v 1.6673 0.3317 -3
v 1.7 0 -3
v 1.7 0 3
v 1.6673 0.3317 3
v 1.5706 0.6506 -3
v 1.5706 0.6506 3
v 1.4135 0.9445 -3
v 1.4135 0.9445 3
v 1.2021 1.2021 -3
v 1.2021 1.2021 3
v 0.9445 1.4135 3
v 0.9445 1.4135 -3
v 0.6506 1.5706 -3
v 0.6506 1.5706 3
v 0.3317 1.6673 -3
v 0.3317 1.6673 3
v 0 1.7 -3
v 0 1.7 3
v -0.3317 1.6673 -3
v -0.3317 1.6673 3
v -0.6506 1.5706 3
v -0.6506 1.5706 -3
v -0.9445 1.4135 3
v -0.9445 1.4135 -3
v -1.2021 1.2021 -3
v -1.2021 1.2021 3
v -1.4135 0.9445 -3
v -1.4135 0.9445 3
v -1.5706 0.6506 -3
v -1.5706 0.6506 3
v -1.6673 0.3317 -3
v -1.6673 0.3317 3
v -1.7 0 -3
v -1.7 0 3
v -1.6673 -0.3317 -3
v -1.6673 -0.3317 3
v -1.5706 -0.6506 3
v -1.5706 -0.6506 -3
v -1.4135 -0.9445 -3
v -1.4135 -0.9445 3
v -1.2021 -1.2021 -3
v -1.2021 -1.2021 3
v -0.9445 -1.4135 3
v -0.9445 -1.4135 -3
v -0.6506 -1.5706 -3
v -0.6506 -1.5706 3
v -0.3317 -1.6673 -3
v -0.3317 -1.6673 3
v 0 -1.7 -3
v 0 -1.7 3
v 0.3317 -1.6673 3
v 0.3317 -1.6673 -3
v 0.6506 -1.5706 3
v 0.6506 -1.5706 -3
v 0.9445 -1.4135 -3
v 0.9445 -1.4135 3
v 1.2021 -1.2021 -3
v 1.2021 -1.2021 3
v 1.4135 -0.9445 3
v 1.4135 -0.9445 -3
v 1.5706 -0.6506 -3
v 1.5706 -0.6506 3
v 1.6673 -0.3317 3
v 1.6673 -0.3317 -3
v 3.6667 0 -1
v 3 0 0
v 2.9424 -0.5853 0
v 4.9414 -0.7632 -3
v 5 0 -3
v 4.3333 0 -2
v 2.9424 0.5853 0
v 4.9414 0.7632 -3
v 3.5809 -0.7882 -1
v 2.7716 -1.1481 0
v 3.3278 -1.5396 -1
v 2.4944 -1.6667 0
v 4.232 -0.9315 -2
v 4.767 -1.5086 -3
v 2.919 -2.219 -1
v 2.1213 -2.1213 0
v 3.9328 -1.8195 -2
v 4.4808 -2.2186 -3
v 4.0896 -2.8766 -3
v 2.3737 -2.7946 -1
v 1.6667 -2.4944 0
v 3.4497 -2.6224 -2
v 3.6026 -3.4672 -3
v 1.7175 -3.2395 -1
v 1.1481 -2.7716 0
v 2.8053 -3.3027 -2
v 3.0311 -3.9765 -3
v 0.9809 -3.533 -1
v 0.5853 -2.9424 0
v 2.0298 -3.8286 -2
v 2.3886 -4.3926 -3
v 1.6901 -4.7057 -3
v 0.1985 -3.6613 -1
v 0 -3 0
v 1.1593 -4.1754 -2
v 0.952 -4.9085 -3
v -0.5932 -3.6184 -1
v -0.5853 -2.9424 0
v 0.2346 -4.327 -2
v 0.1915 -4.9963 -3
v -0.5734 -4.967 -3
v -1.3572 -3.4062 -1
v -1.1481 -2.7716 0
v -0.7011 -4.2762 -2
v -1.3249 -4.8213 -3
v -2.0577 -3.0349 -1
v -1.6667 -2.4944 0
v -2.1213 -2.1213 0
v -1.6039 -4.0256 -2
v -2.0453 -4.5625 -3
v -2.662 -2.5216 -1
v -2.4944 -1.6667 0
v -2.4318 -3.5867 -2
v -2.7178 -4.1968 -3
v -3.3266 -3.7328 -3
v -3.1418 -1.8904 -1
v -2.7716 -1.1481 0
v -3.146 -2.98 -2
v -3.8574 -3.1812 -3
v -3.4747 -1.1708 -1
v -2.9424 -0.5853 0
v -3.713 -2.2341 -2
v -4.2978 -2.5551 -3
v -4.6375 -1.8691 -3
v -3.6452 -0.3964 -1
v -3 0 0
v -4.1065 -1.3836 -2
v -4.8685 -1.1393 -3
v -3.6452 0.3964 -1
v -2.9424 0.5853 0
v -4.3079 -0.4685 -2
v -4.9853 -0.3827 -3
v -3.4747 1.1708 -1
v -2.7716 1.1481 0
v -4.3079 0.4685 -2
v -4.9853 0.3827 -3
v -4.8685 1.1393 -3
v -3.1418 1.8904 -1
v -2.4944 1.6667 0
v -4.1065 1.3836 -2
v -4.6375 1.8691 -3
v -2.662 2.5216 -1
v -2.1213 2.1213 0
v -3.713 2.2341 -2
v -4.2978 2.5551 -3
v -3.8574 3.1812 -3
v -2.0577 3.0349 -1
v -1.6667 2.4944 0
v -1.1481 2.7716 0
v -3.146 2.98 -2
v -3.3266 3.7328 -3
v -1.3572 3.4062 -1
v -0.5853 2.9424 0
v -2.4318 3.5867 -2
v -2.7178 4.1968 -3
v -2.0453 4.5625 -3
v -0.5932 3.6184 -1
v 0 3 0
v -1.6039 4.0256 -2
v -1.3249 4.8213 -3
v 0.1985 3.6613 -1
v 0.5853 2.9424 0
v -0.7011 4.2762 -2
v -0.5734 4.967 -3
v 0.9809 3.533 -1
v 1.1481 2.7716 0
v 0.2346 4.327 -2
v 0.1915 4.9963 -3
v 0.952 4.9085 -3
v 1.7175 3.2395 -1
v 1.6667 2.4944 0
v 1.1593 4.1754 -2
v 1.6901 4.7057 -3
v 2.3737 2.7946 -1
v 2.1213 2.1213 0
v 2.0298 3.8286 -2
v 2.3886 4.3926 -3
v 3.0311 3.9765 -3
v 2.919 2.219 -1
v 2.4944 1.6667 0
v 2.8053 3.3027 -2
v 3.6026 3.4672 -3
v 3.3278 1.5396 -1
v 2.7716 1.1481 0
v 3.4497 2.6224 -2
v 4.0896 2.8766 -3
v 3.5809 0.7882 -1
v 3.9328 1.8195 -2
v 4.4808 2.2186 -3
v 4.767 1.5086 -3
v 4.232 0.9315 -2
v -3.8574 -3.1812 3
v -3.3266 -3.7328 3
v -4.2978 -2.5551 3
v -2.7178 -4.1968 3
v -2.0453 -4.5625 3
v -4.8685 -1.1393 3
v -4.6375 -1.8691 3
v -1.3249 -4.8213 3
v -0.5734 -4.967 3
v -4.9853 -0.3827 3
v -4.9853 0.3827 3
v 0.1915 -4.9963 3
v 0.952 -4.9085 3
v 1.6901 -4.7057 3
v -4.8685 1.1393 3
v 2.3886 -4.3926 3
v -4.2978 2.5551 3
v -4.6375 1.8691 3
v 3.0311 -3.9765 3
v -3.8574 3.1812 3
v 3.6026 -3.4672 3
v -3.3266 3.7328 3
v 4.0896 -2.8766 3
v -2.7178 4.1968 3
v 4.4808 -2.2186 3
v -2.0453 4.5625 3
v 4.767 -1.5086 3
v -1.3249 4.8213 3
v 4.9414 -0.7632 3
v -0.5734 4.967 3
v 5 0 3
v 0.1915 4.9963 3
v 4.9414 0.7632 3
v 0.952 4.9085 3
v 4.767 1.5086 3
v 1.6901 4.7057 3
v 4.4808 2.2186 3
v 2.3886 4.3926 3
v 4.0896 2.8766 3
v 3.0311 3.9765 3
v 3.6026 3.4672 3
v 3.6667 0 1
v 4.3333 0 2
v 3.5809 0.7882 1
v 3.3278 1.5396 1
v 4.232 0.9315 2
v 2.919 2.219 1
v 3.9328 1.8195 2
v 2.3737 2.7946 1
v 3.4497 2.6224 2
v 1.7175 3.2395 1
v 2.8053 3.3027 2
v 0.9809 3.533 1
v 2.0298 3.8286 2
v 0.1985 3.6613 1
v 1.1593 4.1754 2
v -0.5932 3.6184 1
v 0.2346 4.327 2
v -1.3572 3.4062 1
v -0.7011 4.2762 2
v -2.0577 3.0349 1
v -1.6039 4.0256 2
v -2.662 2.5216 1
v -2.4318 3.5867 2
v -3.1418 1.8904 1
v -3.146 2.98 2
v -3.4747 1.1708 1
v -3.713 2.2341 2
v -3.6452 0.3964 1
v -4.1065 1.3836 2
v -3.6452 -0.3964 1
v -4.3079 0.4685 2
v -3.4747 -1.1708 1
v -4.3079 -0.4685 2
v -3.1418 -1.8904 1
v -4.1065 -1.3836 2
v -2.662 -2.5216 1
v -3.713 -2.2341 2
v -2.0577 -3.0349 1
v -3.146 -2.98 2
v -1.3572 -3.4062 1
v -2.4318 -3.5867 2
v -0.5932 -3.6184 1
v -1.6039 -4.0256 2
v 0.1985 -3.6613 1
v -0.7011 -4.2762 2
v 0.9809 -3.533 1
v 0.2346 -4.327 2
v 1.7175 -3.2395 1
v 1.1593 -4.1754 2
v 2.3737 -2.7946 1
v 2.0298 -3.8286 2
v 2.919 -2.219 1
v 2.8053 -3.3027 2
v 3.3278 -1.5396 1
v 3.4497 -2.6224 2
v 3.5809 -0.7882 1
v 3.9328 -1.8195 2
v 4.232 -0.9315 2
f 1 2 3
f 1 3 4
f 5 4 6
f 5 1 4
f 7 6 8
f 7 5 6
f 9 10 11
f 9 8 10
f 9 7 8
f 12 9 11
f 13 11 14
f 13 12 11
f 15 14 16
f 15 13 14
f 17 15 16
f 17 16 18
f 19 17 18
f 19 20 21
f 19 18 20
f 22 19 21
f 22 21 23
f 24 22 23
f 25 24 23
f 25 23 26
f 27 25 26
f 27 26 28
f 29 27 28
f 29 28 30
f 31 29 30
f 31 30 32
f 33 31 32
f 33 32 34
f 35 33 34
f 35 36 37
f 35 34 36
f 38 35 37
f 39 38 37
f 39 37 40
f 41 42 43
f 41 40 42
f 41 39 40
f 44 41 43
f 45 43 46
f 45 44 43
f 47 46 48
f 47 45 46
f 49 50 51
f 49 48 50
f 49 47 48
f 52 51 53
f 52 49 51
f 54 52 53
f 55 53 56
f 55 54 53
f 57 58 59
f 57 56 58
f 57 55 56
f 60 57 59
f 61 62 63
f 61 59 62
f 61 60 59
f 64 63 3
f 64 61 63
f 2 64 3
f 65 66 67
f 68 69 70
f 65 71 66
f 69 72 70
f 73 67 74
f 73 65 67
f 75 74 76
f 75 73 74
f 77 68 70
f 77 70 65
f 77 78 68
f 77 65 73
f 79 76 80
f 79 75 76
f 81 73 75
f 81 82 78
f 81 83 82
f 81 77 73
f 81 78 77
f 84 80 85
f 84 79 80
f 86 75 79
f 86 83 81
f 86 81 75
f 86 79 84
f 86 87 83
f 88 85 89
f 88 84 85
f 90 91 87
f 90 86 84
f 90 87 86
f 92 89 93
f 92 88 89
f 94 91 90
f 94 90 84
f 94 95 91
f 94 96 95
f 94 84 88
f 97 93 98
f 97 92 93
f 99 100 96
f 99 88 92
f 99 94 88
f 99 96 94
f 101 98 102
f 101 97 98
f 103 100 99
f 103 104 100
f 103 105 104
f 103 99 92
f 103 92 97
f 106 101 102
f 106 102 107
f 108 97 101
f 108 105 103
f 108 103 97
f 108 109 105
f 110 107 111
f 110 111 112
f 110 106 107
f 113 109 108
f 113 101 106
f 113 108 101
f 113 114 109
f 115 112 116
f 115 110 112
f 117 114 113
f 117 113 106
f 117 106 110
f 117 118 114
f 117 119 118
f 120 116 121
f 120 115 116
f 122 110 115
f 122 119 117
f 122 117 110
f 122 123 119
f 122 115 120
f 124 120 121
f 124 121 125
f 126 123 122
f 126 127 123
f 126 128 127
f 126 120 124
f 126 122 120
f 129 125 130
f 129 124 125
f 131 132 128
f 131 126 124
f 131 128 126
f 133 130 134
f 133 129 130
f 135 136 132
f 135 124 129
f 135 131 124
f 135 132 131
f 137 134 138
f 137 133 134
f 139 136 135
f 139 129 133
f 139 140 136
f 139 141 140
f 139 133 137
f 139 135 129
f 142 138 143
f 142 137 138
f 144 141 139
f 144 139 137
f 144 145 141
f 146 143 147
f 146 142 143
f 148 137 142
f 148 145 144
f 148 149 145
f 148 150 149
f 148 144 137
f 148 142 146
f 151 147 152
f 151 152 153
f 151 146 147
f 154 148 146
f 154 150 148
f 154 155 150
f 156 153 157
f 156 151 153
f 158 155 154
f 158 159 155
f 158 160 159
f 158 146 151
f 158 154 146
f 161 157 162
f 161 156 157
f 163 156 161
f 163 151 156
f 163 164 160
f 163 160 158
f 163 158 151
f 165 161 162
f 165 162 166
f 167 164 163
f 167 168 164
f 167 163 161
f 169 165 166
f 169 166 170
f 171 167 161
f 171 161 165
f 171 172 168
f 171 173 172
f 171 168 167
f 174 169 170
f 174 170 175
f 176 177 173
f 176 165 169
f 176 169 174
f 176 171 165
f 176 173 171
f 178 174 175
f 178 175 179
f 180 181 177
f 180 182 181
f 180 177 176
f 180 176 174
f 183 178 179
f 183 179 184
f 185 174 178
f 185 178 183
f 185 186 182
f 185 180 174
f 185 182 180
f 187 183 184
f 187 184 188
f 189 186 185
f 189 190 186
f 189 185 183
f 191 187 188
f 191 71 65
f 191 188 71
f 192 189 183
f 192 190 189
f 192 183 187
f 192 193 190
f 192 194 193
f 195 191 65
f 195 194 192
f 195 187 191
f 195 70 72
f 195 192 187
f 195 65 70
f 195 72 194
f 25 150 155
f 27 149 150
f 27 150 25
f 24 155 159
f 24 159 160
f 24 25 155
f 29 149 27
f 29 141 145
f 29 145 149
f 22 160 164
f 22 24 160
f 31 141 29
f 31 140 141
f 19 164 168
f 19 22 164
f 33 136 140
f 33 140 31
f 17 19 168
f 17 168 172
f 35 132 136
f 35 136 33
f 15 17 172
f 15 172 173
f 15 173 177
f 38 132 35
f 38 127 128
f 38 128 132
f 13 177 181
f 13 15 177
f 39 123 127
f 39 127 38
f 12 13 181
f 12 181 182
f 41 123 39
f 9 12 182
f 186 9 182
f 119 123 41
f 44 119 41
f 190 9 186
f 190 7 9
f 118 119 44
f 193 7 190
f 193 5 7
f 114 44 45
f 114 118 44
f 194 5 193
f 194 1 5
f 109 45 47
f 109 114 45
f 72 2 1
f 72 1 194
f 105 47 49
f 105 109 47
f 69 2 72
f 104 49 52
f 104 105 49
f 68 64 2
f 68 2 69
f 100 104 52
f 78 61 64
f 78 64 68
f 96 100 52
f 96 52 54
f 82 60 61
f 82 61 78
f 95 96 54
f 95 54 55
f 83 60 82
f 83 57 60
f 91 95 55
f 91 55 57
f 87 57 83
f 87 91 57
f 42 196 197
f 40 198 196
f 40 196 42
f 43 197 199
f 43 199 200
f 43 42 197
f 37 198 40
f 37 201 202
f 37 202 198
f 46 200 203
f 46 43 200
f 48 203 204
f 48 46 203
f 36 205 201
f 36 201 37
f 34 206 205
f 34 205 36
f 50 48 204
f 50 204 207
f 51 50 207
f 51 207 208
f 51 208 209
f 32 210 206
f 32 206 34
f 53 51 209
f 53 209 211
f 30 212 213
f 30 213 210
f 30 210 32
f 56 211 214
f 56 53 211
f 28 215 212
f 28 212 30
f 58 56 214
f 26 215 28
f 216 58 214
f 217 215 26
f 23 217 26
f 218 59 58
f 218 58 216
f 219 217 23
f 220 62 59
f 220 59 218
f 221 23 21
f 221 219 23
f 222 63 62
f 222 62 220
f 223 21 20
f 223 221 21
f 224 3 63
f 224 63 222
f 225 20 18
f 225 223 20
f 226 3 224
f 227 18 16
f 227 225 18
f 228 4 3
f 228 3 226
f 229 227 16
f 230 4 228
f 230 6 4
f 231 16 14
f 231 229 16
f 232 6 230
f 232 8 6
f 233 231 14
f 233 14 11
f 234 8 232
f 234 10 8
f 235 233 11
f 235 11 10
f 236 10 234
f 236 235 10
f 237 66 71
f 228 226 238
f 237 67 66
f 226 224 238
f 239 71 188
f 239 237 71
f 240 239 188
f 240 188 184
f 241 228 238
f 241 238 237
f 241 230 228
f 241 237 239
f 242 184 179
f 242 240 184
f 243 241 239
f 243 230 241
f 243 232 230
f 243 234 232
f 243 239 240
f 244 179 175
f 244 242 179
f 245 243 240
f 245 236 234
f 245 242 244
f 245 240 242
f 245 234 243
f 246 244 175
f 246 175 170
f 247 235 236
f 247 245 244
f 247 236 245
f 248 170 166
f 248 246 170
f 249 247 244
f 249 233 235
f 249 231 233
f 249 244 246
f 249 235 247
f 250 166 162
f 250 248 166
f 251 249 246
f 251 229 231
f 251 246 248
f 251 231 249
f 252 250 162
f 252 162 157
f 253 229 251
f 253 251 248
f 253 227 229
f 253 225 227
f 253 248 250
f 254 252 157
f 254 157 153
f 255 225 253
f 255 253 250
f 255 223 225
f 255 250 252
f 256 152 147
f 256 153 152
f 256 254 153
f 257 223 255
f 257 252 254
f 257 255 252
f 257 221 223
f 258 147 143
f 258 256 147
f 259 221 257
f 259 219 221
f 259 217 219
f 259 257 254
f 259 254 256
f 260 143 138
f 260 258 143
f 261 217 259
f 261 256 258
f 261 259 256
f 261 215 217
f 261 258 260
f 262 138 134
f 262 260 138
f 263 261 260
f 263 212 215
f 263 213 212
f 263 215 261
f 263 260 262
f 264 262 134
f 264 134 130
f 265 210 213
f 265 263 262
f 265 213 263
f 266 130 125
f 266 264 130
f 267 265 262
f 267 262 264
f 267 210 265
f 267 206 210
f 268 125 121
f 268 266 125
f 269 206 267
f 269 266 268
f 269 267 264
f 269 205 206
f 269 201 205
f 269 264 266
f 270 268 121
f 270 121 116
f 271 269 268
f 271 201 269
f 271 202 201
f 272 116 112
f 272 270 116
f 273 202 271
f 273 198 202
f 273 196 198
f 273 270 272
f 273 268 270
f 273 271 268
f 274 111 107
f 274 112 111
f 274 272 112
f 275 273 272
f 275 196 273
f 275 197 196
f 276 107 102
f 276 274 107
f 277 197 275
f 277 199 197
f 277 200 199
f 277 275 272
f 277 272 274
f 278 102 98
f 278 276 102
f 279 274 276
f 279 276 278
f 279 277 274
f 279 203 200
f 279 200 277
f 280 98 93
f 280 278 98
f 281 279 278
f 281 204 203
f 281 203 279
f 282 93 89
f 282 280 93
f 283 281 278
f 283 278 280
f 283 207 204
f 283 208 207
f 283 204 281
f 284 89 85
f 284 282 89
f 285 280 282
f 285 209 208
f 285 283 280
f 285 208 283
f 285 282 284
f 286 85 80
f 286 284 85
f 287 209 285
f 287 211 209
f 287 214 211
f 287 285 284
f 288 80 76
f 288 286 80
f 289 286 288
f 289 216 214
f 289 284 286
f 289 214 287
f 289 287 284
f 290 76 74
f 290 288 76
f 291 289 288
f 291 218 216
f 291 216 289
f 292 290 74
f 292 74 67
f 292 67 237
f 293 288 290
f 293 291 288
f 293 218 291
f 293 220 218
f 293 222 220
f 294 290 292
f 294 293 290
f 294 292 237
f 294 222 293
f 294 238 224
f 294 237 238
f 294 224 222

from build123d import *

# Parameters (mm, degrees)
CYLINDER_R     = 1.7
CYLINDER_DEPTH = 10


with BuildPart() as cilindro:
    # Cylinder → Cylinder (new body)
    with BuildSketch(Plane.XY.offset(-5)):
        Circle(CYLINDER_R)
    extrude(amount=CYLINDER_DEPTH)


with BuildPart() as cono:
    # Cone → Cone (revolve)
    with BuildSketch(Plane.XZ):
        Polygon((0, 0), (3, 0), (5, 3), (0, 3), align=None)
    revolve(axis=Axis((0, 0, 0), (0, 0, 1)))


with BuildPart() as tensioner:
    # Cone001 → Cone001 (revolve)
    with BuildSketch(Plane(origin=(0, 0, 0), x_dir=(1, 0, 0), z_dir=(0, 1, 0))):
        Polygon((0, 0), (3, 0), (5, 3), (0, 3), align=None)
    revolve(axis=Axis((0, 0, 0), (0, 0, -1)))

    # Fusion: union Cono
    add(cono.part)

    # Cut: cut Cilindro
    add(cilindro.part, mode=Mode.SUBTRACT)


solid = tensioner.part
